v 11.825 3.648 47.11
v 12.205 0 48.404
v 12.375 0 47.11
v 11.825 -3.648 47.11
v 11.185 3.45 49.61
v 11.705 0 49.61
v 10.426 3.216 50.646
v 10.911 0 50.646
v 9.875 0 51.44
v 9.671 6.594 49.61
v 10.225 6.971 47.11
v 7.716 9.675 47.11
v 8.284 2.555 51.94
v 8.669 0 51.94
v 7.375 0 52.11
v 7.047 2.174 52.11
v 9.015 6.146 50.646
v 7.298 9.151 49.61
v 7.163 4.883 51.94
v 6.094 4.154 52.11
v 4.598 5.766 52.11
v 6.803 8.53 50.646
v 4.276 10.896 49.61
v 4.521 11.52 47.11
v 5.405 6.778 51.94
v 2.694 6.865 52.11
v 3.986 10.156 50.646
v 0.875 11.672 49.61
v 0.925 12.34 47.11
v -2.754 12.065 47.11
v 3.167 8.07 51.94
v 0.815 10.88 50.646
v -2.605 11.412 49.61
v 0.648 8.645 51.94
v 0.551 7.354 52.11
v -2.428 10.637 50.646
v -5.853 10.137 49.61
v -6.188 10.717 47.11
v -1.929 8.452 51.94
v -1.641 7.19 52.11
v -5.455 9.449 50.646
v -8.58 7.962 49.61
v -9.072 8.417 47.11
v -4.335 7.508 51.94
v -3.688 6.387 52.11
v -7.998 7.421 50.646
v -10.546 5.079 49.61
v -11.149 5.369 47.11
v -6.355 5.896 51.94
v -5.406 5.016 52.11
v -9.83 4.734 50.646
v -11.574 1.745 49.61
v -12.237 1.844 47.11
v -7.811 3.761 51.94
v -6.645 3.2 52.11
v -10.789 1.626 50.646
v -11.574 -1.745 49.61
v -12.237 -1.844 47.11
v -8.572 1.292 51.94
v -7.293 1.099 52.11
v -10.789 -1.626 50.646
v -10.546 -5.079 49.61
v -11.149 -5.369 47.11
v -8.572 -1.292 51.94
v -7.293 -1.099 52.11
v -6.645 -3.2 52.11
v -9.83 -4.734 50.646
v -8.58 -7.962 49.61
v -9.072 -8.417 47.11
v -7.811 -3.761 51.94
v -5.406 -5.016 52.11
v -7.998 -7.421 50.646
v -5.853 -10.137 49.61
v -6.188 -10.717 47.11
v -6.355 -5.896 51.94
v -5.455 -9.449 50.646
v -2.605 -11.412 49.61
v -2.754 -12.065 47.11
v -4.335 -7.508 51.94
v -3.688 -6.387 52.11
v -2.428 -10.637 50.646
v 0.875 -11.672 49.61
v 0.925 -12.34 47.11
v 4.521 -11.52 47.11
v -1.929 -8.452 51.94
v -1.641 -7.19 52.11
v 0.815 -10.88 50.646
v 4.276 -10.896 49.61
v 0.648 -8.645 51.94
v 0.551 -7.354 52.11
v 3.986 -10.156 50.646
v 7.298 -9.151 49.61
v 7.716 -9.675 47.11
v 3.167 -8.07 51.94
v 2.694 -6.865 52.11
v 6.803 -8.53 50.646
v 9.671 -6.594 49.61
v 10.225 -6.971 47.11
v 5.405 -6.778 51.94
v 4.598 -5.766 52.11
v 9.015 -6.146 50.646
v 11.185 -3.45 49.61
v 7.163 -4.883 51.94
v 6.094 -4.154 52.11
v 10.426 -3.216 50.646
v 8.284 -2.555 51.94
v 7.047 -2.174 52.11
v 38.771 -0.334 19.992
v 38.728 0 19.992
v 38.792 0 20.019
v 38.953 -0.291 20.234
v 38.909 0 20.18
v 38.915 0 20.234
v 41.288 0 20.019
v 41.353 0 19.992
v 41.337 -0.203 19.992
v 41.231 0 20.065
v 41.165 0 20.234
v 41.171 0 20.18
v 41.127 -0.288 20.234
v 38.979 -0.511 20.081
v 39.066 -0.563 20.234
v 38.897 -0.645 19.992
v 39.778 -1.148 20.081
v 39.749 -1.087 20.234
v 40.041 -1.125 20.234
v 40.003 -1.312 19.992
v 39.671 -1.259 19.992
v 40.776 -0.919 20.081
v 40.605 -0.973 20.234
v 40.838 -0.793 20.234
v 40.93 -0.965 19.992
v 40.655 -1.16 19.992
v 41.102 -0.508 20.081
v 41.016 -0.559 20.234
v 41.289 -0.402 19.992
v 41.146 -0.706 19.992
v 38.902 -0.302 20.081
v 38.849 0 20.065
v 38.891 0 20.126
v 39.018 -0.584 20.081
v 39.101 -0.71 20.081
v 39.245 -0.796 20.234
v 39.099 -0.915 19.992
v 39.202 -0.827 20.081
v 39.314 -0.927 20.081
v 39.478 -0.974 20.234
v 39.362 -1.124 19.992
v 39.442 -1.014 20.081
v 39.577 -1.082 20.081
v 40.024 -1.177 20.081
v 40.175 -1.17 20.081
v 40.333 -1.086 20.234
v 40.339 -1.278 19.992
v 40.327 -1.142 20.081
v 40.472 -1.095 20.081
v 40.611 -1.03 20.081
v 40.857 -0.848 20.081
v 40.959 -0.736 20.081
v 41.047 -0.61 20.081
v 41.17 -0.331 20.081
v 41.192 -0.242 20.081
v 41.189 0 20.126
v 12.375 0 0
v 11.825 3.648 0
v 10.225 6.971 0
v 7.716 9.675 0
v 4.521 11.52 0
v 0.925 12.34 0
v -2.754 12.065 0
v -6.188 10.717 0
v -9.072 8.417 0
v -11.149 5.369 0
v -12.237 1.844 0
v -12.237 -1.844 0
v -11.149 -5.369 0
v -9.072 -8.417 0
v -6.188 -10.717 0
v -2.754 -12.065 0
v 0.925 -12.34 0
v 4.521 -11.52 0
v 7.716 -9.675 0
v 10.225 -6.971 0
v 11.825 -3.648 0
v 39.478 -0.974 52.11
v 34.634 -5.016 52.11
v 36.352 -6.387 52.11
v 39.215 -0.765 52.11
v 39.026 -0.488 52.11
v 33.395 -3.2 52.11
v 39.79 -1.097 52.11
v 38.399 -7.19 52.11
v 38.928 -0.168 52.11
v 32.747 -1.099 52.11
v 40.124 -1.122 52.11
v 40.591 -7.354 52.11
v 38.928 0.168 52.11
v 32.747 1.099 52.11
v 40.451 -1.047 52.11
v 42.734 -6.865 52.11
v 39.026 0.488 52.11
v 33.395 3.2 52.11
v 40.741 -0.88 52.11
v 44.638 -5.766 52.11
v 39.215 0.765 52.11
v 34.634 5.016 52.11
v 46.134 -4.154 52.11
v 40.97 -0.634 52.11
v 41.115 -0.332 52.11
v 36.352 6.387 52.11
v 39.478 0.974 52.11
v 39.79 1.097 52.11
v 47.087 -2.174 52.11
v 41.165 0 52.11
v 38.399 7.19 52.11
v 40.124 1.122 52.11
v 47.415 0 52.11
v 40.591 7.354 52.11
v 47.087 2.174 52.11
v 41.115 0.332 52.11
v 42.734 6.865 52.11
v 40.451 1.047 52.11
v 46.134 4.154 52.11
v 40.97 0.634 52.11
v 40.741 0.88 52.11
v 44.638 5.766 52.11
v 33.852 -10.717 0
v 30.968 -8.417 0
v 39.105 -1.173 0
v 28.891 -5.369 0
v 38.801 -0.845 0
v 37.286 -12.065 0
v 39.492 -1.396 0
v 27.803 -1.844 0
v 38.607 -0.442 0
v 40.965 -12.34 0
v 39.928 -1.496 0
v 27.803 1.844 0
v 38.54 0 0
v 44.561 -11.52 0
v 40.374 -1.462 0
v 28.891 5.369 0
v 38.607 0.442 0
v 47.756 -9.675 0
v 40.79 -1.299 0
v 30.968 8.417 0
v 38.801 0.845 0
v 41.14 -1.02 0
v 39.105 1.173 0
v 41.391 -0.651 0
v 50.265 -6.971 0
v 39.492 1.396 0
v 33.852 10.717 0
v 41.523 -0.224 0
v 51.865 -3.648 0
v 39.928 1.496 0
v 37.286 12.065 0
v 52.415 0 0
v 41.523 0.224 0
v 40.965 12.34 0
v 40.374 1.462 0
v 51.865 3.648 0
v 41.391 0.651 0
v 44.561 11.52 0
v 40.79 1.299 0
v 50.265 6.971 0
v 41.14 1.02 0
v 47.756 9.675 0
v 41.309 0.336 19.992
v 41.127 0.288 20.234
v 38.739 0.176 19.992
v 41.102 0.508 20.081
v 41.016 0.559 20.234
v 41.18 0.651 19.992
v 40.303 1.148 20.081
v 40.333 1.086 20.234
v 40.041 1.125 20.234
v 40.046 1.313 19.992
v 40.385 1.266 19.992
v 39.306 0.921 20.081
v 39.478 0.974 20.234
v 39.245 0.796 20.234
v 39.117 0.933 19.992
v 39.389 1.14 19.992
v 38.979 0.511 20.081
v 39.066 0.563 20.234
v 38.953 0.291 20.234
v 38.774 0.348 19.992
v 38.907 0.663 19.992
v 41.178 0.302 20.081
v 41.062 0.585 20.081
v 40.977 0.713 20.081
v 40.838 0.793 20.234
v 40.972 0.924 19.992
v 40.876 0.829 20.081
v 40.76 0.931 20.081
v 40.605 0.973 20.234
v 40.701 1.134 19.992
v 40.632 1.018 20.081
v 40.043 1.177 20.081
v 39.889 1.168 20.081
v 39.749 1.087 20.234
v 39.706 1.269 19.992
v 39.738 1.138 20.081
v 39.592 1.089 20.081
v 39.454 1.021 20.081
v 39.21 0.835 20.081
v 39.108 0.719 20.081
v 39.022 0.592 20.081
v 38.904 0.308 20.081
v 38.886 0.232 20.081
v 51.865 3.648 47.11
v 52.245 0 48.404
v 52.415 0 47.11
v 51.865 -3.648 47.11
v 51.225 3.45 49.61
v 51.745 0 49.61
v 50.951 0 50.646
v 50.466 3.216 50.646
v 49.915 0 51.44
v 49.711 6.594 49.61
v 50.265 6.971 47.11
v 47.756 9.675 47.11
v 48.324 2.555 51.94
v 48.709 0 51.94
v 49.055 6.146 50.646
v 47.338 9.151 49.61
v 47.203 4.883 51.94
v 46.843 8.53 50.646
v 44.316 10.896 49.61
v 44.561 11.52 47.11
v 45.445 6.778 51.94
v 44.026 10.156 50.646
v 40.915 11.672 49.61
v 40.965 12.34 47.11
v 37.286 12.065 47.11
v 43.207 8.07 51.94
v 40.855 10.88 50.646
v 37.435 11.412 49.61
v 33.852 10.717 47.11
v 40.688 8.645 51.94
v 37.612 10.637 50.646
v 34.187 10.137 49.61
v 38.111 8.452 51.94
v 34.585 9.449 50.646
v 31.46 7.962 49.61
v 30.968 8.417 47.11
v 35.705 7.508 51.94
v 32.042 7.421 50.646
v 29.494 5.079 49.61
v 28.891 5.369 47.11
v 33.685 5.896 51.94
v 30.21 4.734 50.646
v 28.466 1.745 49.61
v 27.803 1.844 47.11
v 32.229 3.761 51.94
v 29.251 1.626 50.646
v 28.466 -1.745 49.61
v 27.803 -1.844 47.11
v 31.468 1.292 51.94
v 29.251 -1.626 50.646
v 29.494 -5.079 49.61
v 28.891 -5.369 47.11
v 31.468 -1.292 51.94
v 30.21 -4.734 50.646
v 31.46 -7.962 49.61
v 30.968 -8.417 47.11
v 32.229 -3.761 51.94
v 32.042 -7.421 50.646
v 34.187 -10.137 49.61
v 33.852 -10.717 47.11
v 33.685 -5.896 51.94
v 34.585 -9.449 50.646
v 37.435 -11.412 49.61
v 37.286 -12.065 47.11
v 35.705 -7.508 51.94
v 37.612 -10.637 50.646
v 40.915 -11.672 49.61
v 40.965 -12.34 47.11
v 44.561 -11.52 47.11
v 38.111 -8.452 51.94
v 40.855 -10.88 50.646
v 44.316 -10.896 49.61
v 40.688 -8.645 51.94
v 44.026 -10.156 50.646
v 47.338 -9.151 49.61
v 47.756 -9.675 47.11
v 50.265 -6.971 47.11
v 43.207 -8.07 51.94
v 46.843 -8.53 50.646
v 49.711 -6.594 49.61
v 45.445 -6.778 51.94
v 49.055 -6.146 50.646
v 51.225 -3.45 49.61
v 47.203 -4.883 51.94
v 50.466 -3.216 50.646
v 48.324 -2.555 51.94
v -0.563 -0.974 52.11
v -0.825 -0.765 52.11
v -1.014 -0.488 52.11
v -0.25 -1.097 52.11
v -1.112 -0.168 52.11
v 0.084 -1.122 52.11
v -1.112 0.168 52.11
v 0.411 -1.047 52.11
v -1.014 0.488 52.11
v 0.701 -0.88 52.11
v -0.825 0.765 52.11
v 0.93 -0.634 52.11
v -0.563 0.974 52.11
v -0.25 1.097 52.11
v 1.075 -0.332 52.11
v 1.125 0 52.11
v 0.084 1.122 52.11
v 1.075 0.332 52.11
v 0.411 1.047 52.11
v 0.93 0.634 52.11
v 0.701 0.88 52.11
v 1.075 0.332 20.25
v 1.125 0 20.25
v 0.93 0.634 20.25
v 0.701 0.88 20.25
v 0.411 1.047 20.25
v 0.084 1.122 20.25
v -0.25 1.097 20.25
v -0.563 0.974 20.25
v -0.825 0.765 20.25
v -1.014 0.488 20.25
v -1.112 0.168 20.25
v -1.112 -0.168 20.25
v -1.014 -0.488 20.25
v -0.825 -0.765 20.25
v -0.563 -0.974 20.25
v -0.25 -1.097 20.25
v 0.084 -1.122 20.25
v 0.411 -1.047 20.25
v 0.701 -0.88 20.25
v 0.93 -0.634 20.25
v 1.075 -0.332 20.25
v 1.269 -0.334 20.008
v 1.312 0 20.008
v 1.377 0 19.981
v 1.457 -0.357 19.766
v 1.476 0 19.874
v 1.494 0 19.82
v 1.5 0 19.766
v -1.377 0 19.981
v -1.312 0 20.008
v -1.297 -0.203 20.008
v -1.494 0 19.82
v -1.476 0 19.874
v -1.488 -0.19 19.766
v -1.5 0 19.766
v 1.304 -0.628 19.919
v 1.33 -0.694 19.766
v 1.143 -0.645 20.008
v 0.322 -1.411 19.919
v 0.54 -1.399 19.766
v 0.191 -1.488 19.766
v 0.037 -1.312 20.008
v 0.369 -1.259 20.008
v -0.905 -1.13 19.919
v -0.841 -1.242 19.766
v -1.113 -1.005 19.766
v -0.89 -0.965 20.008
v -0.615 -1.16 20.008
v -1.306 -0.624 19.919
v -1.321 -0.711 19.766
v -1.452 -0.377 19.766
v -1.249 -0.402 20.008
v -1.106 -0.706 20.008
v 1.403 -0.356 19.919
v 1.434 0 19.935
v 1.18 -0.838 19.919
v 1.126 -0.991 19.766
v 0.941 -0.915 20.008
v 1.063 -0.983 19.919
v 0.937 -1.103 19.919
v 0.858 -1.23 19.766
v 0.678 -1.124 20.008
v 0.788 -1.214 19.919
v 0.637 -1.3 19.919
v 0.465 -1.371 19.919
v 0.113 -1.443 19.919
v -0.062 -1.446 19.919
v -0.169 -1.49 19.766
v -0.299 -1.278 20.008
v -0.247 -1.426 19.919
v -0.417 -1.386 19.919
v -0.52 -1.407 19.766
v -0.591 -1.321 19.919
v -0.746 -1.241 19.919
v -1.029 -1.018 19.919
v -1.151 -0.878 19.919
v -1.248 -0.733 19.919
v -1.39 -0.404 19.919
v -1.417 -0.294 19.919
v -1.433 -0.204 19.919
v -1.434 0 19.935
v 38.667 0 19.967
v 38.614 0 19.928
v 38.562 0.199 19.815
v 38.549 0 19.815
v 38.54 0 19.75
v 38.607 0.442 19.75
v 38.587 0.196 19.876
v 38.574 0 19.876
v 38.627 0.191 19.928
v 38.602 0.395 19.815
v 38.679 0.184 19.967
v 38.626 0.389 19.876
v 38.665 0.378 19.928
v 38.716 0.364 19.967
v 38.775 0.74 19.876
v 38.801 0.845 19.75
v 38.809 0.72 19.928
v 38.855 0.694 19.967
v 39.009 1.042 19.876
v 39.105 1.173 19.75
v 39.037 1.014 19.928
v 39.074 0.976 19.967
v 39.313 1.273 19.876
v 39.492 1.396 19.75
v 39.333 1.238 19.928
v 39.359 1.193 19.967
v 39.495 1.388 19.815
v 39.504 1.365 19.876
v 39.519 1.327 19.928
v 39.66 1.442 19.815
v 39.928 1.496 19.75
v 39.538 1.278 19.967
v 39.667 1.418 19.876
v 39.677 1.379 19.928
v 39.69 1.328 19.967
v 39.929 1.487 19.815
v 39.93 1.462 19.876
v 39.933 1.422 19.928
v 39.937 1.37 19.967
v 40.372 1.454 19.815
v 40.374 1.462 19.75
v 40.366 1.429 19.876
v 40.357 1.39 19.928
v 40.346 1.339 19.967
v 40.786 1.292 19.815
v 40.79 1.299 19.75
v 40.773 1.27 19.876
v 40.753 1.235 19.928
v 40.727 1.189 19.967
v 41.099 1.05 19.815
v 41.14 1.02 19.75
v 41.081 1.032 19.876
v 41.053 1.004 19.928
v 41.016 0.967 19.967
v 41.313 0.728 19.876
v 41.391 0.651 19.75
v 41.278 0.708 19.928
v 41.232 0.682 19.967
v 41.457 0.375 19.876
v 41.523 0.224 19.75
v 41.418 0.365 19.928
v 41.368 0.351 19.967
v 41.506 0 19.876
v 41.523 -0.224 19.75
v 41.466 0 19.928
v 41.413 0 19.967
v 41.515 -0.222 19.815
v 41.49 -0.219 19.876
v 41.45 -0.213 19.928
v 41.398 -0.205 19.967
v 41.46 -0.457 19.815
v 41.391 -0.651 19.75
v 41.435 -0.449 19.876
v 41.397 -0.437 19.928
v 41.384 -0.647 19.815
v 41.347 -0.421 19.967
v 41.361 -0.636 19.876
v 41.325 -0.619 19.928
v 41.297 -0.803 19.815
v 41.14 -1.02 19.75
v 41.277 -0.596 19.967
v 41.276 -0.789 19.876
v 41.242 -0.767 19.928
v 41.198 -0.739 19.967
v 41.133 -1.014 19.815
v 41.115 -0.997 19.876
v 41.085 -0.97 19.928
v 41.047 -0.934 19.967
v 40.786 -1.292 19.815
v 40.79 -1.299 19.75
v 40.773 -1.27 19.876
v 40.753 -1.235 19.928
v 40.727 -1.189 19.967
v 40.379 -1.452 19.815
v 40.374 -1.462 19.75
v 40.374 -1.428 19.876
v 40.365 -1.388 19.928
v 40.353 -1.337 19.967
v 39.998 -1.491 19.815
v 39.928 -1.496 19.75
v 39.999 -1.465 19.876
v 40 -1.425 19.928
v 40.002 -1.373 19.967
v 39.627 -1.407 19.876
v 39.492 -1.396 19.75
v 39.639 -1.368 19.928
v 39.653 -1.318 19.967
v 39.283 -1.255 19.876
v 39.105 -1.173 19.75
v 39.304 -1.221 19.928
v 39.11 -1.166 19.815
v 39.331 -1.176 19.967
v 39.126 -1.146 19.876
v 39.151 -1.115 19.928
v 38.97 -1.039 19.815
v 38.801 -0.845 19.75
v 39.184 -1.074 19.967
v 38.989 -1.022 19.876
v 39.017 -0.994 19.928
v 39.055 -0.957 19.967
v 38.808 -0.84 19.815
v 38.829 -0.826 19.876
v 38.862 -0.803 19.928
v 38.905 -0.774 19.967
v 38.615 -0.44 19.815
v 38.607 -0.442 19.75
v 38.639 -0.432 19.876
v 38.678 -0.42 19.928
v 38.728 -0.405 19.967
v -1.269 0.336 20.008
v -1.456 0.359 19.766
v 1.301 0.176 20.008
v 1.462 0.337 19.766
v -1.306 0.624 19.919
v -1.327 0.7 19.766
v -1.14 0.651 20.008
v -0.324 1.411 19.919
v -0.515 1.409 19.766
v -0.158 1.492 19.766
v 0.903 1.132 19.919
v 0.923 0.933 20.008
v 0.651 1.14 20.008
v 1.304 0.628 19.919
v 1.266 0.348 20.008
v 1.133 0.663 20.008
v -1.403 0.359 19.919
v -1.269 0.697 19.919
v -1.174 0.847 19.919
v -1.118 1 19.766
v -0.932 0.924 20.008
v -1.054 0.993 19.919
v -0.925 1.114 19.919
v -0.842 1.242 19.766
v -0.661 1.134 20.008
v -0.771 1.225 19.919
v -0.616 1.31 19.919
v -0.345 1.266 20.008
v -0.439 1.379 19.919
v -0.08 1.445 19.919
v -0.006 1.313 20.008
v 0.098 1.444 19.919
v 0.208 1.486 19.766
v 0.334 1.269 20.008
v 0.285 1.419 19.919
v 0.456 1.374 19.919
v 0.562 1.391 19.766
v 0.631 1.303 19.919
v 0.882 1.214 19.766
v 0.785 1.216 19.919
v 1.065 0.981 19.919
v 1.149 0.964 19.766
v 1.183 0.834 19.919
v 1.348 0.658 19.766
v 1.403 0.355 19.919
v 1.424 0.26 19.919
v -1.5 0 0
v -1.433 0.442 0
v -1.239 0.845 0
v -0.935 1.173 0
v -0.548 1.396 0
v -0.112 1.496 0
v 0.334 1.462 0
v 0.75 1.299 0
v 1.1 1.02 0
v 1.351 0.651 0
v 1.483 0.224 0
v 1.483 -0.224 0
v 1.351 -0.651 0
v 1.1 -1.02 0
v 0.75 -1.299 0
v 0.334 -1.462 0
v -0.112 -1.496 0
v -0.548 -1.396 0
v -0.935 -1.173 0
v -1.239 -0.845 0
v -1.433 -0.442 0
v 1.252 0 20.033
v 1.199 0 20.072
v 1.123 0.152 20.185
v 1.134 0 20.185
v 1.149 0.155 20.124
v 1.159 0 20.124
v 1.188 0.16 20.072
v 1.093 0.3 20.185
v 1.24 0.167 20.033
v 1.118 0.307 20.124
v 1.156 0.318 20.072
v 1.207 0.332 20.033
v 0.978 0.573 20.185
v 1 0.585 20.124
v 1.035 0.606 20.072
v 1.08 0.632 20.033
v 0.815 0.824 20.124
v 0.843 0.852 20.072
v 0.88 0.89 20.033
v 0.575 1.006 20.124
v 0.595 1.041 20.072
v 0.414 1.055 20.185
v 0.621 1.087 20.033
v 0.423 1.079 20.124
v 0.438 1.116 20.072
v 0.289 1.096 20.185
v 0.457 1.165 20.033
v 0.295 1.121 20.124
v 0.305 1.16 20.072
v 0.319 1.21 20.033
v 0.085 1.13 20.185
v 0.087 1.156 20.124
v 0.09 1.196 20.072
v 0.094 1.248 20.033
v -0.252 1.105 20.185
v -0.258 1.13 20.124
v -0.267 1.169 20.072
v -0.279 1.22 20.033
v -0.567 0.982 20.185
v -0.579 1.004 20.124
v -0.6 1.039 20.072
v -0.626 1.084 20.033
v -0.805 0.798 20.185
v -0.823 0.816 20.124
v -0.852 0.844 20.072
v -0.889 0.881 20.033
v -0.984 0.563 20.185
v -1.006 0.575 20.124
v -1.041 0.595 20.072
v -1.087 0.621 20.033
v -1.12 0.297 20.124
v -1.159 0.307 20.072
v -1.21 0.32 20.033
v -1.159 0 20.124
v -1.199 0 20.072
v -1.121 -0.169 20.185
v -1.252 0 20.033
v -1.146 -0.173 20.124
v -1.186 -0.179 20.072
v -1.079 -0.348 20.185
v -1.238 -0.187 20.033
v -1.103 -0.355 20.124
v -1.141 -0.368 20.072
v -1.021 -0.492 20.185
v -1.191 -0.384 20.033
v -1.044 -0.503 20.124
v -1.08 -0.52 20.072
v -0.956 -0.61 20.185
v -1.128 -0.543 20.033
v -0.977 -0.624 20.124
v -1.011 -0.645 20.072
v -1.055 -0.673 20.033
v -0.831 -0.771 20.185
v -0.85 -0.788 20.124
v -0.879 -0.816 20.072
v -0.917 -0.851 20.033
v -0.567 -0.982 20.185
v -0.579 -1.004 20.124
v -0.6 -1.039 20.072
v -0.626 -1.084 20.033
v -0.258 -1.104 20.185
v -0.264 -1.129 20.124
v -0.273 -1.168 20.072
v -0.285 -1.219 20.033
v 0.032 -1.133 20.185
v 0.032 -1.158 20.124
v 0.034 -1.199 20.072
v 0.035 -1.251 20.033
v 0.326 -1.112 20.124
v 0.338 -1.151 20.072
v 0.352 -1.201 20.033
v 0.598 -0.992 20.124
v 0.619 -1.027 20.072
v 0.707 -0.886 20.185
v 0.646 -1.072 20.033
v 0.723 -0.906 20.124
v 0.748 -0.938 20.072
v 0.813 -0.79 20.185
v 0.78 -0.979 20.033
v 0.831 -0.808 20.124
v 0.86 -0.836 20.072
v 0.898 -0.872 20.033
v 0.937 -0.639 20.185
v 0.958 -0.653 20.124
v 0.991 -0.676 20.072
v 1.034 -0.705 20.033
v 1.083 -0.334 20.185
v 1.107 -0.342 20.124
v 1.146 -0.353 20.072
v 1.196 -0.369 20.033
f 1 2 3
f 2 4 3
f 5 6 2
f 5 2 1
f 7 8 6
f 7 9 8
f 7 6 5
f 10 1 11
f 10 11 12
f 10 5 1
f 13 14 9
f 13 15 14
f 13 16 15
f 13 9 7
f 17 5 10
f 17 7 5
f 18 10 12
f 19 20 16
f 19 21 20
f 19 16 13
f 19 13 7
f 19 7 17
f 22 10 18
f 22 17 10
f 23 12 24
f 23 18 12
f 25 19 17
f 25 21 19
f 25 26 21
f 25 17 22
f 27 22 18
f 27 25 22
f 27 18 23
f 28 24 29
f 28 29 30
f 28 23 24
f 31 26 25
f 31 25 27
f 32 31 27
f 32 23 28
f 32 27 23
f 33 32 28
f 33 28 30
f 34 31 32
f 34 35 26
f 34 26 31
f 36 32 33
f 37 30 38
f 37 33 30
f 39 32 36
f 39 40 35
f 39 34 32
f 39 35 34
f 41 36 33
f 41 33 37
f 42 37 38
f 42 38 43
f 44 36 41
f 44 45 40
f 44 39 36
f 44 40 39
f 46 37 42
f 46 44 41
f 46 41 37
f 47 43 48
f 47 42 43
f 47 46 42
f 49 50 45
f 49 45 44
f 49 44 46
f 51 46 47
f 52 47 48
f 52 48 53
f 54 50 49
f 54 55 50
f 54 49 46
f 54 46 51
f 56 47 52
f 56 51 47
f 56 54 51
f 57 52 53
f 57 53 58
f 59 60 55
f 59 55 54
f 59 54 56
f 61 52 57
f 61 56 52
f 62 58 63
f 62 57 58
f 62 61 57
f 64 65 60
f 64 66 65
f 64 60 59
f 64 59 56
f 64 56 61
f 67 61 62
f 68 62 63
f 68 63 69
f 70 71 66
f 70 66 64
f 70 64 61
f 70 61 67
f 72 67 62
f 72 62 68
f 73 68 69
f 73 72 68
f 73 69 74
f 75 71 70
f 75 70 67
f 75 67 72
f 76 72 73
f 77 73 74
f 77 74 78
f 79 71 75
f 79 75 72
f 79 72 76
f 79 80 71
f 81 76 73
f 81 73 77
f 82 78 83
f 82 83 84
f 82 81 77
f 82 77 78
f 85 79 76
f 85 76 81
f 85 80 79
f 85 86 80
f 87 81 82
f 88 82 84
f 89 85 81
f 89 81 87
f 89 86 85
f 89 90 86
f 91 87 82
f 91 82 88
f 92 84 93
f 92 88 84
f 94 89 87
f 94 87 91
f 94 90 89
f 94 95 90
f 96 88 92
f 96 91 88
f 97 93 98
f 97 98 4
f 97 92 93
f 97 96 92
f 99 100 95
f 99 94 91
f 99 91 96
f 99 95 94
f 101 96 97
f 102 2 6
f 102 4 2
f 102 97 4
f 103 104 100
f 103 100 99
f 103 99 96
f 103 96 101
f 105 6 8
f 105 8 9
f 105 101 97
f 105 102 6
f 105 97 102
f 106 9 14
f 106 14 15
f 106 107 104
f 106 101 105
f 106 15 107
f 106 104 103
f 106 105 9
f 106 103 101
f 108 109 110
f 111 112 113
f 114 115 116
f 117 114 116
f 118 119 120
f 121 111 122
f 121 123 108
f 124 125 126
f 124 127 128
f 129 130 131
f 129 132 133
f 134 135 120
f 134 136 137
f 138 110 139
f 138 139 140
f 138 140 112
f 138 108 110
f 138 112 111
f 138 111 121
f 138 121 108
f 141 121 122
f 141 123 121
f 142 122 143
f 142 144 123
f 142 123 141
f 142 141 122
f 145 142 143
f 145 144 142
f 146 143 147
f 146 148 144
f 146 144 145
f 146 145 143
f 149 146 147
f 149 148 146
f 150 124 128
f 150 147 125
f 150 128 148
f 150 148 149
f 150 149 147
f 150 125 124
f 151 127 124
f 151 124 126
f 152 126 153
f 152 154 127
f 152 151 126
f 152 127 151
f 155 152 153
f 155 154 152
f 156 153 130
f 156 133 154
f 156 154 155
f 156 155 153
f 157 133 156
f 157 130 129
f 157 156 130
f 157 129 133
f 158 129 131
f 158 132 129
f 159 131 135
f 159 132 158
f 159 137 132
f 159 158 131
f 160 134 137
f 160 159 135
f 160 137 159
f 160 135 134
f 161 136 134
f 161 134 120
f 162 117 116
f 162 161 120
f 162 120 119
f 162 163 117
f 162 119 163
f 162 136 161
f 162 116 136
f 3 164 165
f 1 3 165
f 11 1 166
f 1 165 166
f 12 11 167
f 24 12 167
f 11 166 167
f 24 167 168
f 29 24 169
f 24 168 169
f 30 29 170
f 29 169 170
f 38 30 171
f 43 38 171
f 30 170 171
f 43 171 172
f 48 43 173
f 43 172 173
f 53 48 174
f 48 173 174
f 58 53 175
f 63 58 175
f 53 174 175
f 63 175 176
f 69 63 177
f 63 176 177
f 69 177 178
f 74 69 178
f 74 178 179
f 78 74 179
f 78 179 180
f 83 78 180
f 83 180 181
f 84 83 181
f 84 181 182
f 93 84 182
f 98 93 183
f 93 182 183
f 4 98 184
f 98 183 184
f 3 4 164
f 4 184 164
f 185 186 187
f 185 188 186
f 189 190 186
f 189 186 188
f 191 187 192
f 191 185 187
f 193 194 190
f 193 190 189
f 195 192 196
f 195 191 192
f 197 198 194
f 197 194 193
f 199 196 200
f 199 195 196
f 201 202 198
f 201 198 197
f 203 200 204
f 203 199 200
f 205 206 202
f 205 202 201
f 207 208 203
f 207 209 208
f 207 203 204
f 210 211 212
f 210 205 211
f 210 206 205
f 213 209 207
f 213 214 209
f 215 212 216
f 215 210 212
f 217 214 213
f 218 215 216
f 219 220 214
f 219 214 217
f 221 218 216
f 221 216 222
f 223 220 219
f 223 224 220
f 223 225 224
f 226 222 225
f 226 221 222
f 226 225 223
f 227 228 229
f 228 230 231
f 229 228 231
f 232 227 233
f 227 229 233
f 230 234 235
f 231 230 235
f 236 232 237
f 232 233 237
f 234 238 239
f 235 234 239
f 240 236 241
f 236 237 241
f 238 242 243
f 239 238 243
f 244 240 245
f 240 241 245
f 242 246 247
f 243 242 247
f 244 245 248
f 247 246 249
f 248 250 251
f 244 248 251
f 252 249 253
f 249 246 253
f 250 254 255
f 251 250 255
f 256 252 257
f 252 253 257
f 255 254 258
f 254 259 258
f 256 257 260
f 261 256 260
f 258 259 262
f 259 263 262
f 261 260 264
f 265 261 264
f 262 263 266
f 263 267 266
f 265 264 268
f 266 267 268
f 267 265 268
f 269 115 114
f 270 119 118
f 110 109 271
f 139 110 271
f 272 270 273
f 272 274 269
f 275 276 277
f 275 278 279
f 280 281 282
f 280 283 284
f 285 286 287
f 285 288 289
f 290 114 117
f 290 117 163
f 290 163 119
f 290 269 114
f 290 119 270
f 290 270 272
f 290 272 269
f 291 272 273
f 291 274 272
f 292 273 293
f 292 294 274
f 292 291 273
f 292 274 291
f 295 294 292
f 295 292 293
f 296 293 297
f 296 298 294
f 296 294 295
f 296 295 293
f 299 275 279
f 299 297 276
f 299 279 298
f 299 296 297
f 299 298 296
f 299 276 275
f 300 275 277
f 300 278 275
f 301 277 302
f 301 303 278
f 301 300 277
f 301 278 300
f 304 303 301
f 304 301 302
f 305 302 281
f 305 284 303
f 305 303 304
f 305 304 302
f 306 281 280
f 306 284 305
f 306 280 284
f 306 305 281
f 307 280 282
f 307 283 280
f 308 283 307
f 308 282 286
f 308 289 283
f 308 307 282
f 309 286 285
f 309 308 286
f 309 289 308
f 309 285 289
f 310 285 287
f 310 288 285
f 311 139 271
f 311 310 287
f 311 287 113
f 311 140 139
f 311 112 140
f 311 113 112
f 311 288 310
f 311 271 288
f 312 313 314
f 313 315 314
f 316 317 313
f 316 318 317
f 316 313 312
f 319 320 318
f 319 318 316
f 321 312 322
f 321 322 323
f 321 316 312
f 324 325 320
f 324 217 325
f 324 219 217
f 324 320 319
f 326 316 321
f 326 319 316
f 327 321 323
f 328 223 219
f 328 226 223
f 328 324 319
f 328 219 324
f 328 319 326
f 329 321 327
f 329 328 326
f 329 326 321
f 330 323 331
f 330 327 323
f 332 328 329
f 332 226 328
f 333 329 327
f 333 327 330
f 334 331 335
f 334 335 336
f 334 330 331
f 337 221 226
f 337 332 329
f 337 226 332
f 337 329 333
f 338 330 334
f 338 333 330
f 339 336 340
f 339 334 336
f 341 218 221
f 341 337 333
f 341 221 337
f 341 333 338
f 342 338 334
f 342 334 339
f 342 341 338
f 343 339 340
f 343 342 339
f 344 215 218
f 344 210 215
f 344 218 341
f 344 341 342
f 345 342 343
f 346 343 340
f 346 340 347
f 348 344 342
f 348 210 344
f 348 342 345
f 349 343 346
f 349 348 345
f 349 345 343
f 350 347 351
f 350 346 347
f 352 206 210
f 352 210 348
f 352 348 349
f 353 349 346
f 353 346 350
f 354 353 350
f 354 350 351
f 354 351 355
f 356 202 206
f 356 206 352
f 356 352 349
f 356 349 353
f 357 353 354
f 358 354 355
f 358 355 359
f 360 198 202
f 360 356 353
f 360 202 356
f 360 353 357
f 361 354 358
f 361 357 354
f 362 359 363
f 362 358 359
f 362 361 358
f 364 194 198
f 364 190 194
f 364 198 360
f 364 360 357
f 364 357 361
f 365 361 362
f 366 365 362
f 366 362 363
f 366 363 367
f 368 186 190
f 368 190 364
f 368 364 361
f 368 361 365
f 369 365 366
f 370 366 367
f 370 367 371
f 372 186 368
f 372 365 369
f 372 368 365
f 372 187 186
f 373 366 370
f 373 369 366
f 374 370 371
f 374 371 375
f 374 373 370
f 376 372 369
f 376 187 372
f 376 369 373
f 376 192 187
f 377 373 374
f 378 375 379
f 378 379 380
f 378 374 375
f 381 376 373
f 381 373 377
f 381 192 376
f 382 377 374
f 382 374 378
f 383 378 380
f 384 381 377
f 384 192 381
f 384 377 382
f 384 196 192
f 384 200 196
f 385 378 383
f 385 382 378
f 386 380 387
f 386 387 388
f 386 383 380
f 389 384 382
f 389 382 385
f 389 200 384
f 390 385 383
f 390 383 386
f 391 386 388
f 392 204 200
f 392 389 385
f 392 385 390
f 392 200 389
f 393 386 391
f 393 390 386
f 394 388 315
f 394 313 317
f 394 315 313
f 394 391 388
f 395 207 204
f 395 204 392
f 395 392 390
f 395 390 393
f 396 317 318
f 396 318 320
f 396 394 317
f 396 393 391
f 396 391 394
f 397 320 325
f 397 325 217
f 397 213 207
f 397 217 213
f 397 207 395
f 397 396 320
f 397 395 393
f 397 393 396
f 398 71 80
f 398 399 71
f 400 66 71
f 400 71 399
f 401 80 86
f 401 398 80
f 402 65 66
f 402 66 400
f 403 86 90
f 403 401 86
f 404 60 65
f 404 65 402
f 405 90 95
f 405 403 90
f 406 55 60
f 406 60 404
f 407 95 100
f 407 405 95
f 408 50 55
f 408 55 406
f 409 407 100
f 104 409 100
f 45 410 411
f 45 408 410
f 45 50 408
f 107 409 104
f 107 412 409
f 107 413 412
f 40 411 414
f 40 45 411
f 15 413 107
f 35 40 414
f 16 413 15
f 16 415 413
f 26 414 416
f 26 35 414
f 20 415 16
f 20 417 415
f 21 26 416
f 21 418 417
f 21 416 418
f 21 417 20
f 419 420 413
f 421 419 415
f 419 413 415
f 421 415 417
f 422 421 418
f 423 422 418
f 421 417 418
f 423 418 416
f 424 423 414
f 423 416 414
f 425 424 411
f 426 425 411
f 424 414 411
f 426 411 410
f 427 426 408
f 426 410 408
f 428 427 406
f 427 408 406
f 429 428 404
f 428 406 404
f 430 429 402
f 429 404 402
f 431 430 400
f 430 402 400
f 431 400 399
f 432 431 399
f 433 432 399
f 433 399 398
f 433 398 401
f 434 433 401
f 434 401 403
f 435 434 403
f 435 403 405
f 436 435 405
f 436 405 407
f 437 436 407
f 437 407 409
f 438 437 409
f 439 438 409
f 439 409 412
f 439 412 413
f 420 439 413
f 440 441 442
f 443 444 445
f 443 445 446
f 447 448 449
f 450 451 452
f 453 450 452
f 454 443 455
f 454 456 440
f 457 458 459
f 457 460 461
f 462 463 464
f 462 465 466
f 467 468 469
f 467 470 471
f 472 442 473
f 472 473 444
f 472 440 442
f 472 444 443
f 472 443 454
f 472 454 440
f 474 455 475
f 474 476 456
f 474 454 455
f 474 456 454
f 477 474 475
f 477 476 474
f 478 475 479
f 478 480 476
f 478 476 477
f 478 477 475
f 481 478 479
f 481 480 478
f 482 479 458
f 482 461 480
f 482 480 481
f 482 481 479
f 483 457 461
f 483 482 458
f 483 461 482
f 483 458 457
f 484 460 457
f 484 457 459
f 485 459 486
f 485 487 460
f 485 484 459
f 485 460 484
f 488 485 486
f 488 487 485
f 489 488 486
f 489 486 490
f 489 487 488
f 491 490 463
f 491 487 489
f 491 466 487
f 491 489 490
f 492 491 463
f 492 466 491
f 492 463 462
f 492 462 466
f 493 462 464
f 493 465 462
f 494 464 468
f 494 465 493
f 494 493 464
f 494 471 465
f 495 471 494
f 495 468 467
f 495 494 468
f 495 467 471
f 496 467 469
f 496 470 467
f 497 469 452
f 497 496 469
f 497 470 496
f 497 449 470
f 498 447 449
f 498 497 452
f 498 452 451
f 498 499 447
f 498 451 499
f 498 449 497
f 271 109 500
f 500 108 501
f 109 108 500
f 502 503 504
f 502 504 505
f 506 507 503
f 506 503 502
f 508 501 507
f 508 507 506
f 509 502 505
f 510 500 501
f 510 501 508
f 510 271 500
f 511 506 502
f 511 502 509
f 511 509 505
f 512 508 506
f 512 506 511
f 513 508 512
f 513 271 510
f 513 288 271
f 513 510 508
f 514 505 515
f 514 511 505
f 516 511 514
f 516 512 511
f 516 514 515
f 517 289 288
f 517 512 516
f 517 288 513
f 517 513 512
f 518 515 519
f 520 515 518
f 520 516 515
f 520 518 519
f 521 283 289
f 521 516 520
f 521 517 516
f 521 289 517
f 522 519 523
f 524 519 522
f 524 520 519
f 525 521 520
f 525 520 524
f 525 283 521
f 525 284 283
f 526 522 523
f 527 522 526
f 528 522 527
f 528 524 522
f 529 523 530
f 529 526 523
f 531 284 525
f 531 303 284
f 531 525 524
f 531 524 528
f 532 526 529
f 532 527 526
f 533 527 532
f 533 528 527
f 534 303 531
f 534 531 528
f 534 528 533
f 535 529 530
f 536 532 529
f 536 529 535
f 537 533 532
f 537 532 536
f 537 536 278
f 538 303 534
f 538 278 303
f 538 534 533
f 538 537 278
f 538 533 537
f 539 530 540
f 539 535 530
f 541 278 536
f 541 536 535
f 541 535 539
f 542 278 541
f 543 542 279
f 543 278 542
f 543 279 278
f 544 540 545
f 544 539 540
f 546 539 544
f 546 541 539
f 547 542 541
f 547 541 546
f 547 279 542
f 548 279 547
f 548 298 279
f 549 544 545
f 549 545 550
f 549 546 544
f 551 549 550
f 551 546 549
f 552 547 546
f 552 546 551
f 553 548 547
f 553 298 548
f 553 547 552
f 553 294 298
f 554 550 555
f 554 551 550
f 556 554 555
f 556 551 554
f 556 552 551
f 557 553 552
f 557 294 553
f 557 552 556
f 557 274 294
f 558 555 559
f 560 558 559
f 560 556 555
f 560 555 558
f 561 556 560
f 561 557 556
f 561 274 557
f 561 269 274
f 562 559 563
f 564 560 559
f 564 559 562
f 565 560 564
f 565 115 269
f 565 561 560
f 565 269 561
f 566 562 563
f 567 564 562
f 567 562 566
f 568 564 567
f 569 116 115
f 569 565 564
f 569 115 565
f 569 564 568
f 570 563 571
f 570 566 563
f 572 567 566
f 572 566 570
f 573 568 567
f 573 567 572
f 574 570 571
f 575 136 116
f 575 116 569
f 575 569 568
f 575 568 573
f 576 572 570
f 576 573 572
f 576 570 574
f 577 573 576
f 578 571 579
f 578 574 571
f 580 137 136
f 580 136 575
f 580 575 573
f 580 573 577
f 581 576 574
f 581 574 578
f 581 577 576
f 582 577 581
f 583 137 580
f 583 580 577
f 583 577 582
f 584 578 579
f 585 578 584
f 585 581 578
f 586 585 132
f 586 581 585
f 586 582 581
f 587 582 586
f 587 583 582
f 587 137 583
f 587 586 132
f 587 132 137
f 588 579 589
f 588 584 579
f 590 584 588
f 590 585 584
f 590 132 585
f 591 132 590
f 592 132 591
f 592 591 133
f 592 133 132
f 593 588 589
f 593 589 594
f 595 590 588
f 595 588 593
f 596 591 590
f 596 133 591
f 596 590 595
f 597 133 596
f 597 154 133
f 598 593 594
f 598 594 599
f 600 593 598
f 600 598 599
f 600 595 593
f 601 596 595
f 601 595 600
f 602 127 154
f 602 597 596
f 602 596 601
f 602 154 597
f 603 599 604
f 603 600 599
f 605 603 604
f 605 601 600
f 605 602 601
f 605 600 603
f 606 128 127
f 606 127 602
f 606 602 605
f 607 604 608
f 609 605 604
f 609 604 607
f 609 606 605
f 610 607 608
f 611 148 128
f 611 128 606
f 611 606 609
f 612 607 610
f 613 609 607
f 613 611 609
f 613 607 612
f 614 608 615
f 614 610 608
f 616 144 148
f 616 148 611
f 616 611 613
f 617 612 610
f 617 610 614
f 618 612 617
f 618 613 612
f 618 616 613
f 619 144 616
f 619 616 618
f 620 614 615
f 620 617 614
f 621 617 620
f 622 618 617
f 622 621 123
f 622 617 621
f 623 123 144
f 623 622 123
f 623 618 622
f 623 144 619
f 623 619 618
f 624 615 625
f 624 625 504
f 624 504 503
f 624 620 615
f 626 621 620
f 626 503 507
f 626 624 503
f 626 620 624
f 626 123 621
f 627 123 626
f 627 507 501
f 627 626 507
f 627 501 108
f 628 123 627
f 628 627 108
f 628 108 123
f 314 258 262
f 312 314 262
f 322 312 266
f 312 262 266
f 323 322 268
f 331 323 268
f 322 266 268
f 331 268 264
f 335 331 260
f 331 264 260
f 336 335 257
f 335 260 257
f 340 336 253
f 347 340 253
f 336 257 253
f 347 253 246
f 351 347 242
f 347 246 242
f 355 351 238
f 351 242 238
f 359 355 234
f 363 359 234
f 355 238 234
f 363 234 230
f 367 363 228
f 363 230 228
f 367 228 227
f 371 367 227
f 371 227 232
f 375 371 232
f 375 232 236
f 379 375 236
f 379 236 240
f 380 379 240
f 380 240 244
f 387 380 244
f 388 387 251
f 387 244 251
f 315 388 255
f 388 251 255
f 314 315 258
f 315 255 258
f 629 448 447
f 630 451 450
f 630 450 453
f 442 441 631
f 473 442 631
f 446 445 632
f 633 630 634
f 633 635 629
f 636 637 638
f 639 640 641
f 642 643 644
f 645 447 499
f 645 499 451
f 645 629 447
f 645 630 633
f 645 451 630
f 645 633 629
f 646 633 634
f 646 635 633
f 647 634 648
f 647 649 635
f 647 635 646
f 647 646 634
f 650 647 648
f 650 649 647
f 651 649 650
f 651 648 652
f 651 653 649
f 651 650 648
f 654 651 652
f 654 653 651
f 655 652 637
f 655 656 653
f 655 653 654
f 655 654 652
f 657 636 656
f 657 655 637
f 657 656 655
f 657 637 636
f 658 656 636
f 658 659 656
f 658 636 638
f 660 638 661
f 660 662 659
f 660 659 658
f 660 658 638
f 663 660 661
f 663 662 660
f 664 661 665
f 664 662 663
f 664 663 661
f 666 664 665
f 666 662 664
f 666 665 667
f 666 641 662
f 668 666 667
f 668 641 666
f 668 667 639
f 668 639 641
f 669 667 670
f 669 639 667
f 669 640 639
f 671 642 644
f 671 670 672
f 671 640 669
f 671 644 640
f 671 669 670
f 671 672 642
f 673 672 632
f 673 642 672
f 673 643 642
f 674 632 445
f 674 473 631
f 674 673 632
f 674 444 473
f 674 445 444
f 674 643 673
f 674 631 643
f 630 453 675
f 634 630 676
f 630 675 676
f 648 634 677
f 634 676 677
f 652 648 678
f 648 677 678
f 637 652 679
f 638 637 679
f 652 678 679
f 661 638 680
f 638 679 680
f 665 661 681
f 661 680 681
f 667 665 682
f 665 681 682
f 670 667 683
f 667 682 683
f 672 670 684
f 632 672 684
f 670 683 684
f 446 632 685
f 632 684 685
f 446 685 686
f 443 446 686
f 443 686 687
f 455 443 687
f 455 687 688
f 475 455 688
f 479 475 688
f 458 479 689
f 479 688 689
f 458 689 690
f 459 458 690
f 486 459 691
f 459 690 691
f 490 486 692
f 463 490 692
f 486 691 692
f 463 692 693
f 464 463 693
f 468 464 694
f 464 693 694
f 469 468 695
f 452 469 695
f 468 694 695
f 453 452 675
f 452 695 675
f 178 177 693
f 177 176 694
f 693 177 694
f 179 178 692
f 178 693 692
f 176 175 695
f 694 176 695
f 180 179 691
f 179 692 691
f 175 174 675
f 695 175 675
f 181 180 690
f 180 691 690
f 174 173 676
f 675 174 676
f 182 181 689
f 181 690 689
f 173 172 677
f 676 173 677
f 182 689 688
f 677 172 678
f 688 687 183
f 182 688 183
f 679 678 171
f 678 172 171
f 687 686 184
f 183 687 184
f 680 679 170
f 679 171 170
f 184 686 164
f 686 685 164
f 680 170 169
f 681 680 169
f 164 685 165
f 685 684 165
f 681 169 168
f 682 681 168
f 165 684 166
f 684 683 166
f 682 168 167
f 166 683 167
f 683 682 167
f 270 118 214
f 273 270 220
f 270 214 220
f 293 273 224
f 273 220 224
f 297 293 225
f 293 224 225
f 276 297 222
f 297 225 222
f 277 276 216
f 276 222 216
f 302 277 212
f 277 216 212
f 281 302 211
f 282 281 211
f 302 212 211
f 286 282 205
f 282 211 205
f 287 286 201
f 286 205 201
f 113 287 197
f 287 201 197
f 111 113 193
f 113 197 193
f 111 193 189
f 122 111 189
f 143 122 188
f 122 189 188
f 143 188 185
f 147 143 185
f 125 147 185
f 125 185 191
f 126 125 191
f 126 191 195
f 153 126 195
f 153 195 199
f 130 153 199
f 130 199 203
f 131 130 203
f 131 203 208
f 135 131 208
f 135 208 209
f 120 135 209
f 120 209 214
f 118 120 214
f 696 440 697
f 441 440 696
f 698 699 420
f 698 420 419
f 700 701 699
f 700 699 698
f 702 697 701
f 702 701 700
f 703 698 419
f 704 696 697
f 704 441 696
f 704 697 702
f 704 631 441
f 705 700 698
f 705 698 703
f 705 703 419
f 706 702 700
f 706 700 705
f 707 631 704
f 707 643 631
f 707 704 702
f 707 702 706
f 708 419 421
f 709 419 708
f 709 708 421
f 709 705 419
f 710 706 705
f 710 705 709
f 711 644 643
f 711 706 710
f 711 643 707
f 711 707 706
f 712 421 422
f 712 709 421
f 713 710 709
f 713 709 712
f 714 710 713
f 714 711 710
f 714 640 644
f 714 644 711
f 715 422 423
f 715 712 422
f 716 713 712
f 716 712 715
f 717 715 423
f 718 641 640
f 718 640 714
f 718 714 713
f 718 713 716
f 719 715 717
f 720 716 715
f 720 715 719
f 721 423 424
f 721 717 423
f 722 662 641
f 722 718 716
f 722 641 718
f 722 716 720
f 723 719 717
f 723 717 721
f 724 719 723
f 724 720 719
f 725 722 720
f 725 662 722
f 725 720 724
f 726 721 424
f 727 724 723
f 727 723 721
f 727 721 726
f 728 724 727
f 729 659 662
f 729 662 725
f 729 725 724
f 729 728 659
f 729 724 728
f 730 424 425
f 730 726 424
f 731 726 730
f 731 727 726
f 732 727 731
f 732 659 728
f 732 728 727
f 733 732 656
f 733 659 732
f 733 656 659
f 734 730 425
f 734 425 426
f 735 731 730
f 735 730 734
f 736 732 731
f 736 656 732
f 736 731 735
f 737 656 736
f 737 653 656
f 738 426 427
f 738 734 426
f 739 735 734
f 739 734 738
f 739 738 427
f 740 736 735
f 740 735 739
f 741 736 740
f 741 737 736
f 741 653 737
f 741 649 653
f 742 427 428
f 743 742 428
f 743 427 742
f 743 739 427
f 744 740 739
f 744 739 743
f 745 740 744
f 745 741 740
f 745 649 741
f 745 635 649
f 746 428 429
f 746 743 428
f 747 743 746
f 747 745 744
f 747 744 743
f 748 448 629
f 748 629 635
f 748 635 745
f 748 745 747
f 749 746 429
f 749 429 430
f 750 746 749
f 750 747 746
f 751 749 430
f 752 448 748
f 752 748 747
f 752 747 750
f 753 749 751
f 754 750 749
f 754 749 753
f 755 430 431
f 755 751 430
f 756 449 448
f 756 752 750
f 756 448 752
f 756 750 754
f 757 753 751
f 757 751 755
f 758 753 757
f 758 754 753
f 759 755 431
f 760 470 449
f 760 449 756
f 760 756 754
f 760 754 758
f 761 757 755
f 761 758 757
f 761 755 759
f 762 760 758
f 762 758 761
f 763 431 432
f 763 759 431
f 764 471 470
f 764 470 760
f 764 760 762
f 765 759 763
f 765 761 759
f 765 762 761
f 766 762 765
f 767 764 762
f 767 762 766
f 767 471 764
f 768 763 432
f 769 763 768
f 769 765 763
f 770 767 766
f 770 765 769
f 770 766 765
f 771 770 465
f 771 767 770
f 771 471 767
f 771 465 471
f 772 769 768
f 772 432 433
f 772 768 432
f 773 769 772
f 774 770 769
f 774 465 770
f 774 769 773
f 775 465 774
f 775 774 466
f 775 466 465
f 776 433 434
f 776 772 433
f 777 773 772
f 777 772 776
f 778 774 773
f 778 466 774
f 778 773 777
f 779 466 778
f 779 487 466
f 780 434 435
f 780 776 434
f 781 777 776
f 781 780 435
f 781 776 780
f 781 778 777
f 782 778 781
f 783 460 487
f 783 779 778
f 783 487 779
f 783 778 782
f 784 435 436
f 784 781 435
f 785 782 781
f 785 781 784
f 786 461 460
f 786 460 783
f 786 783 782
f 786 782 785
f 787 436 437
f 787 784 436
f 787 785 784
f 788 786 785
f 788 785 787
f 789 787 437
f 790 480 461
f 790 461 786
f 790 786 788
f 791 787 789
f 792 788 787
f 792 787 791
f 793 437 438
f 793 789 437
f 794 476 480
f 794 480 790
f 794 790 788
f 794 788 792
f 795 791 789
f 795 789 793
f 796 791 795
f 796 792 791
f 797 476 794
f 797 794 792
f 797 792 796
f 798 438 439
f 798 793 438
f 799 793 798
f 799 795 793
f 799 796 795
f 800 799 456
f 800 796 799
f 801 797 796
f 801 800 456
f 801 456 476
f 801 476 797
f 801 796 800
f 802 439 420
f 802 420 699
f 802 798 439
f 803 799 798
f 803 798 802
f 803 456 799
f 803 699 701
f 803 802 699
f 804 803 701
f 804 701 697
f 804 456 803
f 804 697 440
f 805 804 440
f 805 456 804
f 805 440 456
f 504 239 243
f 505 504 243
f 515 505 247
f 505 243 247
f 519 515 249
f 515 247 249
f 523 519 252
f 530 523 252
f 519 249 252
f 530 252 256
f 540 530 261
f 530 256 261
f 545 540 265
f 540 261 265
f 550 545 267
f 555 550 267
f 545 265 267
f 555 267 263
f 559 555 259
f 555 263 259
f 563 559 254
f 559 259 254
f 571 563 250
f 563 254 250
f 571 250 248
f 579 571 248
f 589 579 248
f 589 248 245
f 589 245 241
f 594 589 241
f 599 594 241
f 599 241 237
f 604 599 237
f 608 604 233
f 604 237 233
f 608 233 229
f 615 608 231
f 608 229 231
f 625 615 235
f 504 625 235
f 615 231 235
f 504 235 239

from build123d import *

# Parameters (mm, degrees)
ESQUISSE1_R             = 12.375
BOSS_EXTRU_1_DEPTH      = 52.11
BOSS_EXTRU_1_2_DEPTH    = 52.11
CONG_1_R                = 5
CONG_2_R                = 5
ESQUISSE2_R             = 1.125
ENL_V_MAT_EXTRU_1_DEPTH = 52.11
ESQUISSE3_R             = 1.5
ENL_V_MAT_EXTRU_2_DEPTH = 20
CONG_3_R                = 0.25
CONG_4_R                = 0.25
CONG_5_R                = 0.25
CONG_6_R                = 0.25


with BuildPart() as part:
    # Esquisse1 → Boss.-Extru.1 (new body)
    with BuildSketch(Plane.XY):
        Circle(ESQUISSE1_R)
    extrude(amount=BOSS_EXTRU_1_DEPTH)

    # Congé2
    cong_2_edges = [part.edges().sort_by_distance(p)[0] for p in [
        (-12.375, 0, 52.11),
    ]]
    fillet(cong_2_edges, radius=CONG_2_R)


with BuildPart() as body_2:
    # Esquisse1 → Boss.-Extru.1 2 (new body)
    with BuildSketch(Plane.XY):
        with Locations((40.04, 0)):
            Circle(ESQUISSE1_R)
    extrude(amount=BOSS_EXTRU_1_2_DEPTH)

    # Congé1
    cong_1_edges = [body_2.edges().sort_by_distance(p)[0] for p in [
        (27.665, 0, 52.11),
    ]]
    fillet(cong_1_edges, radius=CONG_1_R)


with BuildPart() as enl_v_mat_extru_1_tool:
    # Esquisse2 → Enlèv. mat.-Extru.1 (new body)
    with BuildSketch(Plane.XY.offset(52.11)):
        Circle(ESQUISSE2_R)
        with Locations((40.04, 0)):
            Circle(ESQUISSE2_R)
    extrude(amount=-ENL_V_MAT_EXTRU_1_DEPTH)


with BuildPart() as part_1:
    add(part.part)

    # Enlèv. mat.-Extru.1: cut by enl_v_mat_extru_1_tool
    add(enl_v_mat_extru_1_tool.part, mode=Mode.SUBTRACT)


with BuildPart() as body_2_1:
    add(body_2.part)

    # Enlèv. mat.-Extru.1: cut by enl_v_mat_extru_1_tool
    add(enl_v_mat_extru_1_tool.part, mode=Mode.SUBTRACT)


with BuildPart() as enl_v_mat_extru_2_tool:
    # Esquisse3 → Enlèv. mat.-Extru.2 (new body)
    with BuildSketch(Plane(origin=(0, 0, 0), x_dir=(-1, 0, 0), z_dir=(0, 0, -1))):
        Circle(ESQUISSE3_R)
        with Locations((-40.04, 0)):
            Circle(ESQUISSE3_R)
    extrude(amount=-ENL_V_MAT_EXTRU_2_DEPTH)


with BuildPart() as part_2:
    add(part_1.part)

    # Enlèv. mat.-Extru.2: cut by enl_v_mat_extru_2_tool
    add(enl_v_mat_extru_2_tool.part, mode=Mode.SUBTRACT)

    # Congé5
    cong_5_edges = [part_2.edges().sort_by_distance(p)[0] for p in [
        (-1.125, 0, 20),
    ]]
    fillet(cong_5_edges, radius=CONG_5_R)

    # Congé6
    cong_6_edges = [part_2.edges().sort_by_distance(p)[0] for p in [
        (1.5, 0, 20),
    ]]
    fillet(cong_6_edges, radius=CONG_6_R)


with BuildPart() as body_2_2:
    add(body_2_1.part)

    # Enlèv. mat.-Extru.2: cut by enl_v_mat_extru_2_tool
    add(enl_v_mat_extru_2_tool.part, mode=Mode.SUBTRACT)

    # Congé3
    cong_3_edges = [body_2_2.edges().sort_by_distance(p)[0] for p in [
        (41.54, 0, 20),
    ]]
    fillet(cong_3_edges, radius=CONG_3_R)

    # Congé4
    cong_4_edges = [body_2_2.edges().sort_by_distance(p)[0] for p in [
        (38.915, 0, 20),
    ]]
    fillet(cong_4_edges, radius=CONG_4_R)


solid = Compound([part_2.part, body_2_2.part])
